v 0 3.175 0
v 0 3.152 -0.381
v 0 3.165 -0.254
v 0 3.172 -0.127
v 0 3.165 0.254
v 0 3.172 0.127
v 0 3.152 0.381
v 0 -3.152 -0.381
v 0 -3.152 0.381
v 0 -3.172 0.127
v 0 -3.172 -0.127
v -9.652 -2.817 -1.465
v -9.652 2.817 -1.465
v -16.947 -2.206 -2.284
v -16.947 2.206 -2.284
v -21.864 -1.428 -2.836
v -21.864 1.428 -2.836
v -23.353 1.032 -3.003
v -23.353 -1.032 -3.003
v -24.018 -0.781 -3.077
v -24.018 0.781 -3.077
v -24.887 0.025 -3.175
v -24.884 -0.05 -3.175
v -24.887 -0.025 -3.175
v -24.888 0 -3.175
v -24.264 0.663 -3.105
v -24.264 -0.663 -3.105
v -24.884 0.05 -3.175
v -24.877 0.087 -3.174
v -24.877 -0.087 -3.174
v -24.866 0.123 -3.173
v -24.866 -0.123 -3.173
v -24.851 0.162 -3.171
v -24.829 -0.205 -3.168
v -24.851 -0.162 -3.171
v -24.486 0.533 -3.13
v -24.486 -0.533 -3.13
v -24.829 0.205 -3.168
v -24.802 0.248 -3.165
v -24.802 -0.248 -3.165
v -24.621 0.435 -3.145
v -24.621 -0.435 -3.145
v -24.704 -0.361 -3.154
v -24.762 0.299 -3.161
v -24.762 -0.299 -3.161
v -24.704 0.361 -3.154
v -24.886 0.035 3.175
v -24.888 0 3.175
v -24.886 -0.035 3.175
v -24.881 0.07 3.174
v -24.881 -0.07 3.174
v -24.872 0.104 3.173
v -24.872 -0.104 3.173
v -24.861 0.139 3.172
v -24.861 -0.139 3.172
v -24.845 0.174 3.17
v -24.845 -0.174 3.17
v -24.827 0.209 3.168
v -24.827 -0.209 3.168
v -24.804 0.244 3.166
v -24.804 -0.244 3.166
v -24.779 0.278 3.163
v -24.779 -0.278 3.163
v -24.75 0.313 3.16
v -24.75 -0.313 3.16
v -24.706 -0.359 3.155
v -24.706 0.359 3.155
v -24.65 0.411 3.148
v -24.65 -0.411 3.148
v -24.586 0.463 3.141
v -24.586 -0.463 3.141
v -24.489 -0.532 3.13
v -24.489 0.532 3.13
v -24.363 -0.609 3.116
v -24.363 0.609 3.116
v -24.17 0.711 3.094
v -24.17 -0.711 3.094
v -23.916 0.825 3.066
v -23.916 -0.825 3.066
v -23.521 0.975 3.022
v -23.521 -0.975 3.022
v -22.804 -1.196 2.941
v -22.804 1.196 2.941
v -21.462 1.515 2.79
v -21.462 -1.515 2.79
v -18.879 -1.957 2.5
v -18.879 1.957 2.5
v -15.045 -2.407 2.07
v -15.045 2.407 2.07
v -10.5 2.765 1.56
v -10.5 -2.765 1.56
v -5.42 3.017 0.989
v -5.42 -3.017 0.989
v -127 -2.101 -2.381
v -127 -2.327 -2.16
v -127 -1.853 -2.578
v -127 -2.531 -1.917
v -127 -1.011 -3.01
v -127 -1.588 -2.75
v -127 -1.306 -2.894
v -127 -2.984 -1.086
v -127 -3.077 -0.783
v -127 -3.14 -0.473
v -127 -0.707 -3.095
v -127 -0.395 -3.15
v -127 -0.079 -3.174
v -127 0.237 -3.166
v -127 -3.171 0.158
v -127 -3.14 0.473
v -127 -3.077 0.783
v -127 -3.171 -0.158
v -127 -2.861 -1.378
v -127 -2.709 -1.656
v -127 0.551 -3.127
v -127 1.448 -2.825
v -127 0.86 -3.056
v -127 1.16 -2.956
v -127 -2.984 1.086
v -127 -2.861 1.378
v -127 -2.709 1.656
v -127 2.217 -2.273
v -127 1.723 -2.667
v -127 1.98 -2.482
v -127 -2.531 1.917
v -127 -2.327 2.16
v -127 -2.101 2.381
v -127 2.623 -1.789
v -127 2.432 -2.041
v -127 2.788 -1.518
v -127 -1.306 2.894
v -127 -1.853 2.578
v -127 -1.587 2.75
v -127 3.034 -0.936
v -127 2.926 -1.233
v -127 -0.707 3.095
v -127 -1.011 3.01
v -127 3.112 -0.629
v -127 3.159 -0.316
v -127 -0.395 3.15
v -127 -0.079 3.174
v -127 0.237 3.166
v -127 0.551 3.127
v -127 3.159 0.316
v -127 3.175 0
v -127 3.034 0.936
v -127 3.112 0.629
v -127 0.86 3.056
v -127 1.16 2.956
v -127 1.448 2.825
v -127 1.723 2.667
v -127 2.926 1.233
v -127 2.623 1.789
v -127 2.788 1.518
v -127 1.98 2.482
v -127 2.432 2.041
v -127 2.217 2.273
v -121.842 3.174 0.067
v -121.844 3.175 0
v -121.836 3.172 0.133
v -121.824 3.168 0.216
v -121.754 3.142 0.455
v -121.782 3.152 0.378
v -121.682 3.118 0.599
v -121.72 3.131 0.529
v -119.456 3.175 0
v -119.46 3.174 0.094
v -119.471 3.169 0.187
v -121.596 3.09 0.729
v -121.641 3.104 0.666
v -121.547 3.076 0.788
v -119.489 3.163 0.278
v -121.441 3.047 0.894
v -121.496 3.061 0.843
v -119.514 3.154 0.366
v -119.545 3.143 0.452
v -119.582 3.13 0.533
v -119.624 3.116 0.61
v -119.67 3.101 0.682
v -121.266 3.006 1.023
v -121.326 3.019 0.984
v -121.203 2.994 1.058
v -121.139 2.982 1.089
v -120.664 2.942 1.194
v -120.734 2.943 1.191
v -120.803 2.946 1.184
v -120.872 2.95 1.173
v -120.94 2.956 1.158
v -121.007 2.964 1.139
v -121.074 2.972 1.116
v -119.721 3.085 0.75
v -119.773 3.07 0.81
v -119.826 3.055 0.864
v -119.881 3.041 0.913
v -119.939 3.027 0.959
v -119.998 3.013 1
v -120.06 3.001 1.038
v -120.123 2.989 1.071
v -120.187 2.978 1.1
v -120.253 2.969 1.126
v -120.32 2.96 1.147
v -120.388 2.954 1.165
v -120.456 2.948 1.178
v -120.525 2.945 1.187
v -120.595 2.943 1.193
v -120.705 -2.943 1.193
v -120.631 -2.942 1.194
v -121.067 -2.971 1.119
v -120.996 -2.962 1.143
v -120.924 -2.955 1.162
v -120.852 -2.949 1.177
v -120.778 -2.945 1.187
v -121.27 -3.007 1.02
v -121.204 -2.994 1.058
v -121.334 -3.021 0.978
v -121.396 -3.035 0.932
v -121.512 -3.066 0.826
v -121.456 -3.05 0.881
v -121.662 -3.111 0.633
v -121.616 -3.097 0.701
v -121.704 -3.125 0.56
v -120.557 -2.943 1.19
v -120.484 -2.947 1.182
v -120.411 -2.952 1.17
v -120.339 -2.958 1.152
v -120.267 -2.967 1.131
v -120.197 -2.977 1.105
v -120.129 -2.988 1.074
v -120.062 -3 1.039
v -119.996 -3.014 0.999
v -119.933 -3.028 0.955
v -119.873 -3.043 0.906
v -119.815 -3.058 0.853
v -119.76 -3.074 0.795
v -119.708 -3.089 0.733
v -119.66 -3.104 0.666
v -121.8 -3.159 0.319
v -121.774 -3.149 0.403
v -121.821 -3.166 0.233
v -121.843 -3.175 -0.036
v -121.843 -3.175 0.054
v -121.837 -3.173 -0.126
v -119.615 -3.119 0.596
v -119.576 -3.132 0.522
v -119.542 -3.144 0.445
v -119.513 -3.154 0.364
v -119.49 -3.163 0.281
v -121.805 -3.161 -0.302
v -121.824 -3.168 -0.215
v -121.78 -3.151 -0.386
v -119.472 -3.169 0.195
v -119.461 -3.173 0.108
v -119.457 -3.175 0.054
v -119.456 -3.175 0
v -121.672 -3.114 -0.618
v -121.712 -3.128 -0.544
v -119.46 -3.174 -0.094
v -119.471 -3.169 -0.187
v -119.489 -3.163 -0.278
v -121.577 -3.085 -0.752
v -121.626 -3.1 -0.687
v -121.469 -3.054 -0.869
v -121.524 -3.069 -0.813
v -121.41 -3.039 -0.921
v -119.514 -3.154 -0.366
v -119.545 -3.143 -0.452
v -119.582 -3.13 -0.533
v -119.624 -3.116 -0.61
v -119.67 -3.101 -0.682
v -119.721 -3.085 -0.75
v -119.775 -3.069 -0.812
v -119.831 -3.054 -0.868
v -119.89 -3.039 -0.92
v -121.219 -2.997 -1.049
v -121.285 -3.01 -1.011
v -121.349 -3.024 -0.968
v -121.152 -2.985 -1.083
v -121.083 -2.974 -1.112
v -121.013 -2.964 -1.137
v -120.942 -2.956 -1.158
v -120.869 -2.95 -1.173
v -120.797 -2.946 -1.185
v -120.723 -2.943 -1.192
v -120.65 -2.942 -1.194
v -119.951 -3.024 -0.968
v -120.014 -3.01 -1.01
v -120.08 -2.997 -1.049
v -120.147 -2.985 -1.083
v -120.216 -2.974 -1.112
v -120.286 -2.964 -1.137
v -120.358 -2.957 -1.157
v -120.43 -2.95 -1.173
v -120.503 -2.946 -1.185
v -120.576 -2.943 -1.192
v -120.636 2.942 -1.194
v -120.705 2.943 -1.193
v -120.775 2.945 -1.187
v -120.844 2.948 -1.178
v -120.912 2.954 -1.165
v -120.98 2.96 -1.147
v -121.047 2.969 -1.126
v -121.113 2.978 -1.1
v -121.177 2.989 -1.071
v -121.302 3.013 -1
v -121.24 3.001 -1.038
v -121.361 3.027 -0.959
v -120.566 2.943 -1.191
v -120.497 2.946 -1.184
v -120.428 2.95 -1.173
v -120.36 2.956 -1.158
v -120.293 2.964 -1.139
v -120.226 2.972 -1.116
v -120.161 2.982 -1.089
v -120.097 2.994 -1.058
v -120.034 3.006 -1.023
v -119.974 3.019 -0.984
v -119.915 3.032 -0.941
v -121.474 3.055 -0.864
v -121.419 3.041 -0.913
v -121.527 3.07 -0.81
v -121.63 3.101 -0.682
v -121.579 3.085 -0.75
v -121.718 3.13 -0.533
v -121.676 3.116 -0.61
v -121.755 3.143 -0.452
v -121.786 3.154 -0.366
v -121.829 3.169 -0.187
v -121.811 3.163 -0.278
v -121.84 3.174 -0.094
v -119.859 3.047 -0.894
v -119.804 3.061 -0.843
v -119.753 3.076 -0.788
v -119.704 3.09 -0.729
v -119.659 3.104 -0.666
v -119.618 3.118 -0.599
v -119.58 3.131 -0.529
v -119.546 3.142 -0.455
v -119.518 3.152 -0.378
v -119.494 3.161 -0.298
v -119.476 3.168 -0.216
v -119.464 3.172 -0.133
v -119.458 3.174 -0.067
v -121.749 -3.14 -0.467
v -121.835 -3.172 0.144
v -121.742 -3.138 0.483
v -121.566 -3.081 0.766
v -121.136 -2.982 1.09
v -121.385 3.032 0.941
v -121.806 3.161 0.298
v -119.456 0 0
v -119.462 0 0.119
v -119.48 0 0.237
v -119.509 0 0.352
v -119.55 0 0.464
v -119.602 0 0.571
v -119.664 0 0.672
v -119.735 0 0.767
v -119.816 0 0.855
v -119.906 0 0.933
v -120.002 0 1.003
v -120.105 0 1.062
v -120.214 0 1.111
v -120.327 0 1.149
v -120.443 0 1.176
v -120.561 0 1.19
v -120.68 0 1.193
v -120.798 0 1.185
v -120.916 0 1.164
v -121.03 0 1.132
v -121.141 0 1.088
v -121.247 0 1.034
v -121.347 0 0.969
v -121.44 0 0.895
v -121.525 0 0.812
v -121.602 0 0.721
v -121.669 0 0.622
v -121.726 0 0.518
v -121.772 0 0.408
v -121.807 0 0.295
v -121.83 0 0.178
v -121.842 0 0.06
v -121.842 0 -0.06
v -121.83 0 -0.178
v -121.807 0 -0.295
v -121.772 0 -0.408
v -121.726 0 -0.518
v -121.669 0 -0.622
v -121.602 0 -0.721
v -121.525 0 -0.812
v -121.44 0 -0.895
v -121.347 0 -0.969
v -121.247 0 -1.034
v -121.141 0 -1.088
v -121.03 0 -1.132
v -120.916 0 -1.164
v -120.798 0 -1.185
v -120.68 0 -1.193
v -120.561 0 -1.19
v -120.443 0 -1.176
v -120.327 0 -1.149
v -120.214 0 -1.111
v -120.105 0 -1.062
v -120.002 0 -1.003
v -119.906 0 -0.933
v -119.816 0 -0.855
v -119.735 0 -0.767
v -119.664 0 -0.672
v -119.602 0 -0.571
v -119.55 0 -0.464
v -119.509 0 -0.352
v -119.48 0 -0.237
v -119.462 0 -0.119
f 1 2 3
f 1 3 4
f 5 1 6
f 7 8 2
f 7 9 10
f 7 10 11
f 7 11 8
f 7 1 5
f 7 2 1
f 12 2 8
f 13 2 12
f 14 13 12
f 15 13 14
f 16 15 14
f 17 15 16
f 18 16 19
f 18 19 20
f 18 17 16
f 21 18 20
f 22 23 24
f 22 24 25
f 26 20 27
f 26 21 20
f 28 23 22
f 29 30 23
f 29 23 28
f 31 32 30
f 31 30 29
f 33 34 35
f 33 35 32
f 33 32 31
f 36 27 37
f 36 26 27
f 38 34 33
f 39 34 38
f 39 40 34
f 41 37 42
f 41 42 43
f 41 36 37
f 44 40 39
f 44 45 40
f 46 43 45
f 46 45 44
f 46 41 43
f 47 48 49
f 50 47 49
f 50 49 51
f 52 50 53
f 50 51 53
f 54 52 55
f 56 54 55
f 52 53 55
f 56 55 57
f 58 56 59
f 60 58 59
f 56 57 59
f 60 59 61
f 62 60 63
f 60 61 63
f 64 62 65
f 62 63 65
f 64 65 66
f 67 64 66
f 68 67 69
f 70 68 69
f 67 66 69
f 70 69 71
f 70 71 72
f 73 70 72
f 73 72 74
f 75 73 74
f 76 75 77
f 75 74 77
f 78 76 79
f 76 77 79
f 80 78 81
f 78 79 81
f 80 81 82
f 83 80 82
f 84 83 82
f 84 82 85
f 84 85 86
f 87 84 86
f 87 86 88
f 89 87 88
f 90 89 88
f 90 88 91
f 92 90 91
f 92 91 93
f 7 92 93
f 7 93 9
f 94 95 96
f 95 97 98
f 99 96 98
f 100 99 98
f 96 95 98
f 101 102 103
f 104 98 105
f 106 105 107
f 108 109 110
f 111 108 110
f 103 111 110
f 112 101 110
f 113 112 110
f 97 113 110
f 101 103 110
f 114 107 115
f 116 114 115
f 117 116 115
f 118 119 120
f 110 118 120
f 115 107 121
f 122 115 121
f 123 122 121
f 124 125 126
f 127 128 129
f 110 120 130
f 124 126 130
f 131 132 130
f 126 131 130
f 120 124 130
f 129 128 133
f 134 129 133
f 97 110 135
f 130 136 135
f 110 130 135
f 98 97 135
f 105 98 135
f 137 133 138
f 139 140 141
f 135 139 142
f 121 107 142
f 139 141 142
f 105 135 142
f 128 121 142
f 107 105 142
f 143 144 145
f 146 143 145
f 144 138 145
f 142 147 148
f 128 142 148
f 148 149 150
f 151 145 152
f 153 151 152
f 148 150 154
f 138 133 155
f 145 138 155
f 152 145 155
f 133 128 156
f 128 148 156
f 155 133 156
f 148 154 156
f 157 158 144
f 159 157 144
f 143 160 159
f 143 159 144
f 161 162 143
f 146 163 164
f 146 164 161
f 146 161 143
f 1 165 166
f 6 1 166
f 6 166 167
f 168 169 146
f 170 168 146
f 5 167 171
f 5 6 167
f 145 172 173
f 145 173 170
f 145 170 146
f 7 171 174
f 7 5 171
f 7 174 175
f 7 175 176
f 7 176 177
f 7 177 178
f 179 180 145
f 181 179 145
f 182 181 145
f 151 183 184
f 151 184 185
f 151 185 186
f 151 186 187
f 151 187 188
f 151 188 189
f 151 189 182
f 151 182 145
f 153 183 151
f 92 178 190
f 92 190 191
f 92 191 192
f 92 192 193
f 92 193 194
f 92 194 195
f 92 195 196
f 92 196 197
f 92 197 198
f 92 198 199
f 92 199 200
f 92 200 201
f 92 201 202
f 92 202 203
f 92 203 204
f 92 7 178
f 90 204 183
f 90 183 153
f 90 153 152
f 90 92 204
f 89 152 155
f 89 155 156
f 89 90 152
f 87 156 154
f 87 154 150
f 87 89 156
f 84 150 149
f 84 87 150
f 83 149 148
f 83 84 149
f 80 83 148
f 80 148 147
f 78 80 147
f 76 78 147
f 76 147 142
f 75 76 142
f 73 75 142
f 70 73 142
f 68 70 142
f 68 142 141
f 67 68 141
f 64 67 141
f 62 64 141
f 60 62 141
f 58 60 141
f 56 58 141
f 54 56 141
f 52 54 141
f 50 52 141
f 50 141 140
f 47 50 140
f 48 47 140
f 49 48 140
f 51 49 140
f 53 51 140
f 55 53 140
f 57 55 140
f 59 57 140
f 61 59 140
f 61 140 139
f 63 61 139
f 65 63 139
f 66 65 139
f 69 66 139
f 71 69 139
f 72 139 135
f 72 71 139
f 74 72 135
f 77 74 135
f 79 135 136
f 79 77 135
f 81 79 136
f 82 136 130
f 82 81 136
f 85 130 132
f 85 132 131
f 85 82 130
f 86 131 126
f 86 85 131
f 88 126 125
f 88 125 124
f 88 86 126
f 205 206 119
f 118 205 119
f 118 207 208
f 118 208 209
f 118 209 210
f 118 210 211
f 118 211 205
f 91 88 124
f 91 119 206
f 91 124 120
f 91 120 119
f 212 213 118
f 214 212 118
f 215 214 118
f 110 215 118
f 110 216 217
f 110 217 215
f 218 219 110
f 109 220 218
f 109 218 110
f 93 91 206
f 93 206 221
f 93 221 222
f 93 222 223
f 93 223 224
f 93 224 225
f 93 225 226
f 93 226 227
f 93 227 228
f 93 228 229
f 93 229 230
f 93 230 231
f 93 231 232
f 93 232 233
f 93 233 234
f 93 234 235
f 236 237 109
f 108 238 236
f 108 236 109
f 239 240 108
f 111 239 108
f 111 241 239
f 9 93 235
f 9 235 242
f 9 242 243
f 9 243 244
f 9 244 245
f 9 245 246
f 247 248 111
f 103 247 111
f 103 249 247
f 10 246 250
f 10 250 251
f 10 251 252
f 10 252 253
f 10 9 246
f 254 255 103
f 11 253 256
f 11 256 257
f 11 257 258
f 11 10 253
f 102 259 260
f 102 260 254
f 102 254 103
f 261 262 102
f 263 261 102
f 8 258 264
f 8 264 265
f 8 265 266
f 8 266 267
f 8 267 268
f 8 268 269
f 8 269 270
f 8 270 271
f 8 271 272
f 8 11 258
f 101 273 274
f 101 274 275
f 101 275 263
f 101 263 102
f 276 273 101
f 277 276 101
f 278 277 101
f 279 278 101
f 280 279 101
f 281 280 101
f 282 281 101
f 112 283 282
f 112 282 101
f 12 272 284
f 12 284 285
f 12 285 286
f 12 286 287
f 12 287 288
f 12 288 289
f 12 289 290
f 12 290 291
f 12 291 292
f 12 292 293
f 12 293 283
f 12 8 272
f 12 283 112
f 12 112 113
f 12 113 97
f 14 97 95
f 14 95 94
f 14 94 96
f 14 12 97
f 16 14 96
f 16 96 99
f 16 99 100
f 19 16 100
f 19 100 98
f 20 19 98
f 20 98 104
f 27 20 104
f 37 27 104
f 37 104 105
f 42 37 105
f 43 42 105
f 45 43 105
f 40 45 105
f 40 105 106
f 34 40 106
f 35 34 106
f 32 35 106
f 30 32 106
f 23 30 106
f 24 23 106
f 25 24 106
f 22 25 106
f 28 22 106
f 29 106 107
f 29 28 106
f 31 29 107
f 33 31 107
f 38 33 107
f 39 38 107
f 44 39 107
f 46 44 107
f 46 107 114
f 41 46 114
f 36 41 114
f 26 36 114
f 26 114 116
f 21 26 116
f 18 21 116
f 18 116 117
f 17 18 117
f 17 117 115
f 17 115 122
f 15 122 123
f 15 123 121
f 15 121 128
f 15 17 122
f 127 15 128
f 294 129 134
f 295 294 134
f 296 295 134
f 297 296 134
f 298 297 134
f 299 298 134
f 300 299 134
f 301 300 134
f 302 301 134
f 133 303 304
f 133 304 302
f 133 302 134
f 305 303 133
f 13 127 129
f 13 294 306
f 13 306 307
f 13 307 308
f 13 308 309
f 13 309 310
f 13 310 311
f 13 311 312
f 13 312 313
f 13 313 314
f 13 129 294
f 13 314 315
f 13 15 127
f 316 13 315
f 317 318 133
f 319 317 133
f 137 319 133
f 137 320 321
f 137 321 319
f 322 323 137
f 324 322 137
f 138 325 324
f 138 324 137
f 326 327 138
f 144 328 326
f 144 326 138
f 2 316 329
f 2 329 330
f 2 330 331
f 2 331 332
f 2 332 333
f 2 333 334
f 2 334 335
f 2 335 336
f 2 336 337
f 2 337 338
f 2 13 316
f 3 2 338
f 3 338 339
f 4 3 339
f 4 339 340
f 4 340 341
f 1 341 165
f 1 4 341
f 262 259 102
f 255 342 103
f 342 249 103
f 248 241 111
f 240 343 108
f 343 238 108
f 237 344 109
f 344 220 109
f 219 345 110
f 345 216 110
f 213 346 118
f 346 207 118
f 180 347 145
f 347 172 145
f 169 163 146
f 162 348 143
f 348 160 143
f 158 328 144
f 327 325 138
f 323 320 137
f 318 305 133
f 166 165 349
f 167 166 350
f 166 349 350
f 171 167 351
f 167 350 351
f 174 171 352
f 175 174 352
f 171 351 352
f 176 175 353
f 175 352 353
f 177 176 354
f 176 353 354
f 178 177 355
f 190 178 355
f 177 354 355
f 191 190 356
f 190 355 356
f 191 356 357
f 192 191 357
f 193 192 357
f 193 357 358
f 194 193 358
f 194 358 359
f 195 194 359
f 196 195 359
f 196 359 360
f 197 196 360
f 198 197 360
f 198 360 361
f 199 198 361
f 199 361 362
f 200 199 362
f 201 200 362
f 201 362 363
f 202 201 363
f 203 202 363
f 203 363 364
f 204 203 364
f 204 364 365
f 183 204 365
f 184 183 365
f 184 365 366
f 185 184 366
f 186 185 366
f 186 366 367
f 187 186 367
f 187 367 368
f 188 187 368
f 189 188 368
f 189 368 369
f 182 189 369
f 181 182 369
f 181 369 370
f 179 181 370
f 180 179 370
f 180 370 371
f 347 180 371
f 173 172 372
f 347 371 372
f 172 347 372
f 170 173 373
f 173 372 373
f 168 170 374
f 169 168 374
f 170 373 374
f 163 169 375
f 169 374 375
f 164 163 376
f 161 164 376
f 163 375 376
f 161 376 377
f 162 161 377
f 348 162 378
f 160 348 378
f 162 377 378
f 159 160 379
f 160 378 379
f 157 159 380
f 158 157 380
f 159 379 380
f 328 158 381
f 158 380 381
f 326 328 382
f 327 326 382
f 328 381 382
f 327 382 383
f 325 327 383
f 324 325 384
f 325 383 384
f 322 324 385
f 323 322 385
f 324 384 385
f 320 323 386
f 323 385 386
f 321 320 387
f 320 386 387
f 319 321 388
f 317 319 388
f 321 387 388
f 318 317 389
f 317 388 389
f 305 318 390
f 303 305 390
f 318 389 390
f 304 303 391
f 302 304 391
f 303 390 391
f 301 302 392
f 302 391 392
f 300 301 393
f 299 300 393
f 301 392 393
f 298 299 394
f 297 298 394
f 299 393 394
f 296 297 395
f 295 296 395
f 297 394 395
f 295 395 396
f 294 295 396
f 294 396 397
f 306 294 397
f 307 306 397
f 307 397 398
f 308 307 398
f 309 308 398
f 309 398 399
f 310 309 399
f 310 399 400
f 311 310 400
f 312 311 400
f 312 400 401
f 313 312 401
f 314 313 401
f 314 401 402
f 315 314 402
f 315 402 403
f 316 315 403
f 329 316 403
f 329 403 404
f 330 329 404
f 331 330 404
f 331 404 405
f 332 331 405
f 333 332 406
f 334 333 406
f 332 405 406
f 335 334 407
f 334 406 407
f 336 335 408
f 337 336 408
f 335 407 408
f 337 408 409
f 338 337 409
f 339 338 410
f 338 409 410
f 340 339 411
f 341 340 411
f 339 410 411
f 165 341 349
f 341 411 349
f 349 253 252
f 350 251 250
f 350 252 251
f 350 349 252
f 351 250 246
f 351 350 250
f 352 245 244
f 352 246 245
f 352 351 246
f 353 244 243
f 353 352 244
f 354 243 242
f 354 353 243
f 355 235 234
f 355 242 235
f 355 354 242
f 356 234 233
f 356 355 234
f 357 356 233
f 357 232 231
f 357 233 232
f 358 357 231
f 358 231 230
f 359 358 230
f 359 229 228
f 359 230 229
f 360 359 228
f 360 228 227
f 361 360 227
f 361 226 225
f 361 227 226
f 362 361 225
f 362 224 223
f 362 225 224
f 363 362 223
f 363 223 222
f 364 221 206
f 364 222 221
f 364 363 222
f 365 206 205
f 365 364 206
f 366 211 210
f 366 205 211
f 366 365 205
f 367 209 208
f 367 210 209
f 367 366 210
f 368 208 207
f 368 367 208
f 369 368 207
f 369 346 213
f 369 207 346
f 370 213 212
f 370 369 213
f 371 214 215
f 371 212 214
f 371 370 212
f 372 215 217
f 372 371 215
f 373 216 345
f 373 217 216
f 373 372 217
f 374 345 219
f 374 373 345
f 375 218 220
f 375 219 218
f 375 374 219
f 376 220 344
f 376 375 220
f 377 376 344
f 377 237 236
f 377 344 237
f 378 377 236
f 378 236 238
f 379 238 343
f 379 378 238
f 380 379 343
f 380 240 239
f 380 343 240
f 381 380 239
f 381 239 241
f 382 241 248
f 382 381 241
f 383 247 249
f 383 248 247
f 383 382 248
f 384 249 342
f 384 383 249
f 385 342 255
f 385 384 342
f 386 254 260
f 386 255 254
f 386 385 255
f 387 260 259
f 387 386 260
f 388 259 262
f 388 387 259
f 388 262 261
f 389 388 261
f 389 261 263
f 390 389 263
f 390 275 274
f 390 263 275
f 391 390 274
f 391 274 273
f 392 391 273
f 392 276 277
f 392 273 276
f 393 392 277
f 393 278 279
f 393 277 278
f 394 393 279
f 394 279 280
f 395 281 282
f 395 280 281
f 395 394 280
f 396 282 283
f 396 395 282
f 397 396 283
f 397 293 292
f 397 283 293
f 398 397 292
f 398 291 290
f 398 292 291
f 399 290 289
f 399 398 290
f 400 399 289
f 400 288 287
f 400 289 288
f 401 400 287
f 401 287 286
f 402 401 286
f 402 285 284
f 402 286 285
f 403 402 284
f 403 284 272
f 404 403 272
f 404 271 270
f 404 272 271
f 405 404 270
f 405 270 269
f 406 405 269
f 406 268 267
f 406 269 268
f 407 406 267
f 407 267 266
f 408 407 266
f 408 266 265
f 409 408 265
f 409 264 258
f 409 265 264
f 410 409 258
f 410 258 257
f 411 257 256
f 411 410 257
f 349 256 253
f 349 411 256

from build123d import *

# Parameters (mm, degrees)
F0_R          = 3.175
F1_DEPTH      = 127
F3_DEPTH      = 25.4
F3_DEPTH_BACK = 25.4
F4_R          = 1.1938
F6_DEPTH      = 3.175
F6_DEPTH_BACK = 3.175


# Not quite as in the source:
# - the program builds the solid bodies; features that only make, move or delete a surface that nothing else refers to are left out


with BuildPart() as f1:
    # F0 (on Right) → F1 (new body)
    with BuildSketch(Plane.YZ):
        Circle(F0_R)
    extrude(amount=-F1_DEPTH)

    # F2 (on Front) → F3 (cut, two sides)
    with BuildSketch(Plane.XZ) as f3_sk:
        Polygon((-25.4, 3.2325035427), (0, 0.381), (0, 3.2325035427), align=None)
        Polygon((0, -3.2135259826), (0, -0.381), (-25.4, -3.2325035427), align=None)
    extrude(amount=-F3_DEPTH, mode=Mode.SUBTRACT)
    extrude(f3_sk.sketch, amount=F3_DEPTH_BACK, mode=Mode.SUBTRACT)

    # F4 (on Front) → F6 (cut, two sides)
    with BuildSketch(Plane.XZ) as f6_sk:
        with Locations((-120.65, 0)):
            Circle(F4_R)
    extrude(amount=F6_DEPTH, mode=Mode.SUBTRACT)
    extrude(f6_sk.sketch, amount=-F6_DEPTH_BACK, mode=Mode.SUBTRACT)


solid = f1.part
